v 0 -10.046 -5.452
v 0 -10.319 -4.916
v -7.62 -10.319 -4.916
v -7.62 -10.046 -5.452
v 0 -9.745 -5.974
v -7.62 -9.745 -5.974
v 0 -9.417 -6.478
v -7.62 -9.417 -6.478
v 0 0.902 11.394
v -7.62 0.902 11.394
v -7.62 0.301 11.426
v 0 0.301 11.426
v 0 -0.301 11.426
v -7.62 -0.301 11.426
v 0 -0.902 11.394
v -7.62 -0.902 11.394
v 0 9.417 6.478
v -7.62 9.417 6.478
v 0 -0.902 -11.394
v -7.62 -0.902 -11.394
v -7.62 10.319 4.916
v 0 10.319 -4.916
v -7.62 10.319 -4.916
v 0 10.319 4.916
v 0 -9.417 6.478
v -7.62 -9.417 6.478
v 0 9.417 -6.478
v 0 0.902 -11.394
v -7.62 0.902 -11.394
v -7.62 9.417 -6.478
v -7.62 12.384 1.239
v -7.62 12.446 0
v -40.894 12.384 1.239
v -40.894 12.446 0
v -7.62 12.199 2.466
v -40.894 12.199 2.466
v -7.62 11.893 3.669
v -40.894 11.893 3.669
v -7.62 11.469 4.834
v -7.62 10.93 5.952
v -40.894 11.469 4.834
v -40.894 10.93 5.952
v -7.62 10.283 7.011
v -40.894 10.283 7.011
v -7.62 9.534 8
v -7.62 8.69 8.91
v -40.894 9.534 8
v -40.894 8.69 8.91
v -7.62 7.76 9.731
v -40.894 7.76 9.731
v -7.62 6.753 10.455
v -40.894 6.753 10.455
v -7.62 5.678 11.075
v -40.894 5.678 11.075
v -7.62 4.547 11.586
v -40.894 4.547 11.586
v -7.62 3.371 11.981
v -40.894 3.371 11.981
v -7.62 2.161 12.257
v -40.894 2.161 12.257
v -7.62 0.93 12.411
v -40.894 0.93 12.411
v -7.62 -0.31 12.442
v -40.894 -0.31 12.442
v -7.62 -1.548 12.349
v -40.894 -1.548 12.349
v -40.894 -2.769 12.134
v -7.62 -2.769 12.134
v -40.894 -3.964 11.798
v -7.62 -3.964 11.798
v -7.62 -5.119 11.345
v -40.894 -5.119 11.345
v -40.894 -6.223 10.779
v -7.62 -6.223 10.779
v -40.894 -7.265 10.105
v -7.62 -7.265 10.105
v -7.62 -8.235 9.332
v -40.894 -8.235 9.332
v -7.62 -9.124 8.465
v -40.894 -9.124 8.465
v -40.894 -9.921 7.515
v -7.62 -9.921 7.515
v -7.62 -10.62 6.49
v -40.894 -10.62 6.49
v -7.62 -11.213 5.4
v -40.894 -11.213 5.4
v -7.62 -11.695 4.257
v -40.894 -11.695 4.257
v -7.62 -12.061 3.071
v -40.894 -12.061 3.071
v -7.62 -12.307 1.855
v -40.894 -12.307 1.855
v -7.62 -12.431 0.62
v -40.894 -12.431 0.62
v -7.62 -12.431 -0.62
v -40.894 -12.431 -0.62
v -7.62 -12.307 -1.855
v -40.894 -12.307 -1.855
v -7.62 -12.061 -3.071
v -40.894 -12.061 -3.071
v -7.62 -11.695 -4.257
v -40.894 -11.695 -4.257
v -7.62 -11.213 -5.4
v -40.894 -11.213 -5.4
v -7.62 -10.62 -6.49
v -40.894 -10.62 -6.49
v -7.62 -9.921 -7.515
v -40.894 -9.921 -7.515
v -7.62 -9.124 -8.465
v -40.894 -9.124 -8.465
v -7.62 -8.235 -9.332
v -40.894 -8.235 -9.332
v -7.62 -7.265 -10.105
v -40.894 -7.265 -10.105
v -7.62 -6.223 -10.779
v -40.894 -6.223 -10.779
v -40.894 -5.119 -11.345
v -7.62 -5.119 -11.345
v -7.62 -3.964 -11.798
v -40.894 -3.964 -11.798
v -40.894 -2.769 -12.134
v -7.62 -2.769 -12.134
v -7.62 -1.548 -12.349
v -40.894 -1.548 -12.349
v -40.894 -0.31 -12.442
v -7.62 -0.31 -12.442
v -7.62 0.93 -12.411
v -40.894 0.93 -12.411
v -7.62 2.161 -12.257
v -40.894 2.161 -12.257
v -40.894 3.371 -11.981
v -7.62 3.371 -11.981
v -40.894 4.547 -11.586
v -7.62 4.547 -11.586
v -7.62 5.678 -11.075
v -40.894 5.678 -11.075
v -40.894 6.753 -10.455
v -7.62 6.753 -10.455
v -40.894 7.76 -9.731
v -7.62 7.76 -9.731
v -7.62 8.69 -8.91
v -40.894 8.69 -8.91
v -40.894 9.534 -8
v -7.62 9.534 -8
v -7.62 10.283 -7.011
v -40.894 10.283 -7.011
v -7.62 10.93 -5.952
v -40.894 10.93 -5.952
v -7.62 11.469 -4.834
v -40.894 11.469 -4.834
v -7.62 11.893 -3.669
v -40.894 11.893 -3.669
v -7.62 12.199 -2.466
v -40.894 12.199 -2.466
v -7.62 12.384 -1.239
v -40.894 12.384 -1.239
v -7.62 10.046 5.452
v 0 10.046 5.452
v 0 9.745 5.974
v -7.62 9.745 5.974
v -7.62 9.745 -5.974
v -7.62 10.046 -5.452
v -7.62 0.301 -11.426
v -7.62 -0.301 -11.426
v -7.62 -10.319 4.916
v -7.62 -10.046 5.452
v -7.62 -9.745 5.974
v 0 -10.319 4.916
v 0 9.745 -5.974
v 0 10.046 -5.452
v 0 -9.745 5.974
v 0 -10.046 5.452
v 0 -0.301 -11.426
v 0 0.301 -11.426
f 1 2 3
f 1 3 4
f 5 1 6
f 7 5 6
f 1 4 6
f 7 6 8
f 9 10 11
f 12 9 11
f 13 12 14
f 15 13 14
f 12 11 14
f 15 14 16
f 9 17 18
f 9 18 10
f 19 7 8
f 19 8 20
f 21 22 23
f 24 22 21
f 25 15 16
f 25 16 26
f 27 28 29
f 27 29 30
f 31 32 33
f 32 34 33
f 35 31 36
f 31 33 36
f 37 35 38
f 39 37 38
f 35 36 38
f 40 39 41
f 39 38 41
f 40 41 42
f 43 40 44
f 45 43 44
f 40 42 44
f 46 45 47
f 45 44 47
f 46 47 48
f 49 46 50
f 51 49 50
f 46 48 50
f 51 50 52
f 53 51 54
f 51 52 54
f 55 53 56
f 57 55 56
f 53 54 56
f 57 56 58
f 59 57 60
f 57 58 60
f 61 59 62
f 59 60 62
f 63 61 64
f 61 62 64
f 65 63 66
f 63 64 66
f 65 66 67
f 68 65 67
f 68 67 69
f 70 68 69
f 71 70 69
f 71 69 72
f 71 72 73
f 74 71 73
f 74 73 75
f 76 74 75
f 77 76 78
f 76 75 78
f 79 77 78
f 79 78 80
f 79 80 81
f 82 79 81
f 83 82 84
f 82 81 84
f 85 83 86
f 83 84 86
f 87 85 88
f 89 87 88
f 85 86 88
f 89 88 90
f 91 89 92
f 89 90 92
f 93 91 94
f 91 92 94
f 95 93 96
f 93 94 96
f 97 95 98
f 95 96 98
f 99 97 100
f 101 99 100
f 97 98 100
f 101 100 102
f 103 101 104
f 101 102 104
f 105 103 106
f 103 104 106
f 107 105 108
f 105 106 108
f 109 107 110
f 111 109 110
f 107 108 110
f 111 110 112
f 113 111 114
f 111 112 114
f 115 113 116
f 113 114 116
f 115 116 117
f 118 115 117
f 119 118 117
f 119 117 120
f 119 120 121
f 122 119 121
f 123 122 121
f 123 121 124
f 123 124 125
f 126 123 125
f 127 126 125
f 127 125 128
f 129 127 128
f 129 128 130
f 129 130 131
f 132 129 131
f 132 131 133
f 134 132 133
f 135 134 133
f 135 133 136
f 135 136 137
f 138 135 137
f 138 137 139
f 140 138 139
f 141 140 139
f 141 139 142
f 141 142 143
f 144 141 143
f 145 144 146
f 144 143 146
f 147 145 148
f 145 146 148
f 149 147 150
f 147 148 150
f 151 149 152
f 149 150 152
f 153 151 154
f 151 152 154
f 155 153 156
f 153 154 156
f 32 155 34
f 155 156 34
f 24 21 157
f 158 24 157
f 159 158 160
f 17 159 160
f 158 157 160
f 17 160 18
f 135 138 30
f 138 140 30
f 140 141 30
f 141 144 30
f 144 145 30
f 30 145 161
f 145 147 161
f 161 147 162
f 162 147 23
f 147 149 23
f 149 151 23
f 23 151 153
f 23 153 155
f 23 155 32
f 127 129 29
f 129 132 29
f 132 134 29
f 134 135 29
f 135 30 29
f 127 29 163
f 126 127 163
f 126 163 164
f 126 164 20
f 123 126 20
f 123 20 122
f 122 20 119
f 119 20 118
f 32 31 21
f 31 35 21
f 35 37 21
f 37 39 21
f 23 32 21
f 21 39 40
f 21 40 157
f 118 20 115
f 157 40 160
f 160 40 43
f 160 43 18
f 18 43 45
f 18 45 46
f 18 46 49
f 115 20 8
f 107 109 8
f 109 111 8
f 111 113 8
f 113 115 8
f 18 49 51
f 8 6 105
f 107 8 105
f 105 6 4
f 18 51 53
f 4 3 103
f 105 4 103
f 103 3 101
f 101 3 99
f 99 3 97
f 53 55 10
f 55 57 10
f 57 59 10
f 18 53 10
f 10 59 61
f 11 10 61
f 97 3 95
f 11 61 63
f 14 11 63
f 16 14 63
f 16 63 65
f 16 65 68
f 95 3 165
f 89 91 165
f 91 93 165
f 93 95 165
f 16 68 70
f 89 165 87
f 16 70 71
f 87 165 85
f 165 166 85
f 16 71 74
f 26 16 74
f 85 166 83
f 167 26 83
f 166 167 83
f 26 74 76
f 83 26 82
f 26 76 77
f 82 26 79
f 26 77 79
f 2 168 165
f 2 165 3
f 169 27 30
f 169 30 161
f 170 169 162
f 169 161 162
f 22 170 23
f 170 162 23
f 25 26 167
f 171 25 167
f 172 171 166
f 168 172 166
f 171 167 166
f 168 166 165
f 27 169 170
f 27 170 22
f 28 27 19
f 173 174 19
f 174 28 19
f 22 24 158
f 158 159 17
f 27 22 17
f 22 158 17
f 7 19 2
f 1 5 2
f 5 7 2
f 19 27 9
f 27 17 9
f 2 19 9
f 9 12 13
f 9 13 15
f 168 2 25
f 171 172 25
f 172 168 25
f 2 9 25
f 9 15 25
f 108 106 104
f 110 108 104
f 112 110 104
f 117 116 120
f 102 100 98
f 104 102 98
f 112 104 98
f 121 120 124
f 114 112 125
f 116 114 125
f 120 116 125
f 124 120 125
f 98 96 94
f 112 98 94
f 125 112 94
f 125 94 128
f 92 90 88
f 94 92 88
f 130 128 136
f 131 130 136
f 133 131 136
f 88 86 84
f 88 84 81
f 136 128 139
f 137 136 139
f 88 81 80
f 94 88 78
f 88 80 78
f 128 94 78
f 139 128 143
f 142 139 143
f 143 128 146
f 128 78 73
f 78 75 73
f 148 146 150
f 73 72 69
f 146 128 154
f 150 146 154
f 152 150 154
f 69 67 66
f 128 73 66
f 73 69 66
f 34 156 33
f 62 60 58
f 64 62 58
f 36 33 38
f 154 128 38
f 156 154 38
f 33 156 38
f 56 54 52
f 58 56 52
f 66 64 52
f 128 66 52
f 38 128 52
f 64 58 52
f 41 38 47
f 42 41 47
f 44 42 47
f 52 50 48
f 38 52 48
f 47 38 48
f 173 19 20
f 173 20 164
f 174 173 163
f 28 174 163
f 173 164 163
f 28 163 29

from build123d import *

# Parameters (mm, degrees)
SKETCH3_OUTSIDE_W  = 40.796
SKETCH3_OUTSIDE_H  = 40.796
CUT_EXTRUDE5_DEPTH = 7.62
SKETCH4_R          = 6.35
CUT_EXTRUDE6_DEPTH = 20.05


with BuildPart() as part:
    # Sketch1 → Revolve1 (revolve)
    with BuildSketch(Plane.XY):
        Polygon((0, 11.43), (-7.62, 11.43), (-7.62, 12.446), (-40.894, 12.446), (-40.894, 0), (19.05, 0), (19.05, 6.35), (0, 6.35), align=None)
    revolve(axis=Axis((-40.894, 0, 0), (1, 0, 0)))

    # Sketch3 outside → Cut-Extrude5 (cut)
    with BuildSketch(Plane(origin=(0, 0, 0), x_dir=(0, 0, -1), z_dir=(1, 0, 0))):
        Rectangle(SKETCH3_OUTSIDE_W, SKETCH3_OUTSIDE_H)
        Polygon((5.95753309, 10.31875), (-5.95753309, 10.31875), (-11.91506618, 0), (-5.95753309, -10.31875), (5.95753309, -10.31875), (11.91506618, 0), align=None, mode=Mode.SUBTRACT)
    extrude(amount=-CUT_EXTRUDE5_DEPTH, mode=Mode.SUBTRACT)

    # Sketch4 → Cut-Extrude6 (cut, through all)
    with BuildSketch(Plane(origin=(0, 0, 0), x_dir=(0, 0, -1), z_dir=(1, 0, 0))):
        Circle(SKETCH4_R)
    extrude(amount=CUT_EXTRUDE6_DEPTH, mode=Mode.SUBTRACT)


solid = part.part
